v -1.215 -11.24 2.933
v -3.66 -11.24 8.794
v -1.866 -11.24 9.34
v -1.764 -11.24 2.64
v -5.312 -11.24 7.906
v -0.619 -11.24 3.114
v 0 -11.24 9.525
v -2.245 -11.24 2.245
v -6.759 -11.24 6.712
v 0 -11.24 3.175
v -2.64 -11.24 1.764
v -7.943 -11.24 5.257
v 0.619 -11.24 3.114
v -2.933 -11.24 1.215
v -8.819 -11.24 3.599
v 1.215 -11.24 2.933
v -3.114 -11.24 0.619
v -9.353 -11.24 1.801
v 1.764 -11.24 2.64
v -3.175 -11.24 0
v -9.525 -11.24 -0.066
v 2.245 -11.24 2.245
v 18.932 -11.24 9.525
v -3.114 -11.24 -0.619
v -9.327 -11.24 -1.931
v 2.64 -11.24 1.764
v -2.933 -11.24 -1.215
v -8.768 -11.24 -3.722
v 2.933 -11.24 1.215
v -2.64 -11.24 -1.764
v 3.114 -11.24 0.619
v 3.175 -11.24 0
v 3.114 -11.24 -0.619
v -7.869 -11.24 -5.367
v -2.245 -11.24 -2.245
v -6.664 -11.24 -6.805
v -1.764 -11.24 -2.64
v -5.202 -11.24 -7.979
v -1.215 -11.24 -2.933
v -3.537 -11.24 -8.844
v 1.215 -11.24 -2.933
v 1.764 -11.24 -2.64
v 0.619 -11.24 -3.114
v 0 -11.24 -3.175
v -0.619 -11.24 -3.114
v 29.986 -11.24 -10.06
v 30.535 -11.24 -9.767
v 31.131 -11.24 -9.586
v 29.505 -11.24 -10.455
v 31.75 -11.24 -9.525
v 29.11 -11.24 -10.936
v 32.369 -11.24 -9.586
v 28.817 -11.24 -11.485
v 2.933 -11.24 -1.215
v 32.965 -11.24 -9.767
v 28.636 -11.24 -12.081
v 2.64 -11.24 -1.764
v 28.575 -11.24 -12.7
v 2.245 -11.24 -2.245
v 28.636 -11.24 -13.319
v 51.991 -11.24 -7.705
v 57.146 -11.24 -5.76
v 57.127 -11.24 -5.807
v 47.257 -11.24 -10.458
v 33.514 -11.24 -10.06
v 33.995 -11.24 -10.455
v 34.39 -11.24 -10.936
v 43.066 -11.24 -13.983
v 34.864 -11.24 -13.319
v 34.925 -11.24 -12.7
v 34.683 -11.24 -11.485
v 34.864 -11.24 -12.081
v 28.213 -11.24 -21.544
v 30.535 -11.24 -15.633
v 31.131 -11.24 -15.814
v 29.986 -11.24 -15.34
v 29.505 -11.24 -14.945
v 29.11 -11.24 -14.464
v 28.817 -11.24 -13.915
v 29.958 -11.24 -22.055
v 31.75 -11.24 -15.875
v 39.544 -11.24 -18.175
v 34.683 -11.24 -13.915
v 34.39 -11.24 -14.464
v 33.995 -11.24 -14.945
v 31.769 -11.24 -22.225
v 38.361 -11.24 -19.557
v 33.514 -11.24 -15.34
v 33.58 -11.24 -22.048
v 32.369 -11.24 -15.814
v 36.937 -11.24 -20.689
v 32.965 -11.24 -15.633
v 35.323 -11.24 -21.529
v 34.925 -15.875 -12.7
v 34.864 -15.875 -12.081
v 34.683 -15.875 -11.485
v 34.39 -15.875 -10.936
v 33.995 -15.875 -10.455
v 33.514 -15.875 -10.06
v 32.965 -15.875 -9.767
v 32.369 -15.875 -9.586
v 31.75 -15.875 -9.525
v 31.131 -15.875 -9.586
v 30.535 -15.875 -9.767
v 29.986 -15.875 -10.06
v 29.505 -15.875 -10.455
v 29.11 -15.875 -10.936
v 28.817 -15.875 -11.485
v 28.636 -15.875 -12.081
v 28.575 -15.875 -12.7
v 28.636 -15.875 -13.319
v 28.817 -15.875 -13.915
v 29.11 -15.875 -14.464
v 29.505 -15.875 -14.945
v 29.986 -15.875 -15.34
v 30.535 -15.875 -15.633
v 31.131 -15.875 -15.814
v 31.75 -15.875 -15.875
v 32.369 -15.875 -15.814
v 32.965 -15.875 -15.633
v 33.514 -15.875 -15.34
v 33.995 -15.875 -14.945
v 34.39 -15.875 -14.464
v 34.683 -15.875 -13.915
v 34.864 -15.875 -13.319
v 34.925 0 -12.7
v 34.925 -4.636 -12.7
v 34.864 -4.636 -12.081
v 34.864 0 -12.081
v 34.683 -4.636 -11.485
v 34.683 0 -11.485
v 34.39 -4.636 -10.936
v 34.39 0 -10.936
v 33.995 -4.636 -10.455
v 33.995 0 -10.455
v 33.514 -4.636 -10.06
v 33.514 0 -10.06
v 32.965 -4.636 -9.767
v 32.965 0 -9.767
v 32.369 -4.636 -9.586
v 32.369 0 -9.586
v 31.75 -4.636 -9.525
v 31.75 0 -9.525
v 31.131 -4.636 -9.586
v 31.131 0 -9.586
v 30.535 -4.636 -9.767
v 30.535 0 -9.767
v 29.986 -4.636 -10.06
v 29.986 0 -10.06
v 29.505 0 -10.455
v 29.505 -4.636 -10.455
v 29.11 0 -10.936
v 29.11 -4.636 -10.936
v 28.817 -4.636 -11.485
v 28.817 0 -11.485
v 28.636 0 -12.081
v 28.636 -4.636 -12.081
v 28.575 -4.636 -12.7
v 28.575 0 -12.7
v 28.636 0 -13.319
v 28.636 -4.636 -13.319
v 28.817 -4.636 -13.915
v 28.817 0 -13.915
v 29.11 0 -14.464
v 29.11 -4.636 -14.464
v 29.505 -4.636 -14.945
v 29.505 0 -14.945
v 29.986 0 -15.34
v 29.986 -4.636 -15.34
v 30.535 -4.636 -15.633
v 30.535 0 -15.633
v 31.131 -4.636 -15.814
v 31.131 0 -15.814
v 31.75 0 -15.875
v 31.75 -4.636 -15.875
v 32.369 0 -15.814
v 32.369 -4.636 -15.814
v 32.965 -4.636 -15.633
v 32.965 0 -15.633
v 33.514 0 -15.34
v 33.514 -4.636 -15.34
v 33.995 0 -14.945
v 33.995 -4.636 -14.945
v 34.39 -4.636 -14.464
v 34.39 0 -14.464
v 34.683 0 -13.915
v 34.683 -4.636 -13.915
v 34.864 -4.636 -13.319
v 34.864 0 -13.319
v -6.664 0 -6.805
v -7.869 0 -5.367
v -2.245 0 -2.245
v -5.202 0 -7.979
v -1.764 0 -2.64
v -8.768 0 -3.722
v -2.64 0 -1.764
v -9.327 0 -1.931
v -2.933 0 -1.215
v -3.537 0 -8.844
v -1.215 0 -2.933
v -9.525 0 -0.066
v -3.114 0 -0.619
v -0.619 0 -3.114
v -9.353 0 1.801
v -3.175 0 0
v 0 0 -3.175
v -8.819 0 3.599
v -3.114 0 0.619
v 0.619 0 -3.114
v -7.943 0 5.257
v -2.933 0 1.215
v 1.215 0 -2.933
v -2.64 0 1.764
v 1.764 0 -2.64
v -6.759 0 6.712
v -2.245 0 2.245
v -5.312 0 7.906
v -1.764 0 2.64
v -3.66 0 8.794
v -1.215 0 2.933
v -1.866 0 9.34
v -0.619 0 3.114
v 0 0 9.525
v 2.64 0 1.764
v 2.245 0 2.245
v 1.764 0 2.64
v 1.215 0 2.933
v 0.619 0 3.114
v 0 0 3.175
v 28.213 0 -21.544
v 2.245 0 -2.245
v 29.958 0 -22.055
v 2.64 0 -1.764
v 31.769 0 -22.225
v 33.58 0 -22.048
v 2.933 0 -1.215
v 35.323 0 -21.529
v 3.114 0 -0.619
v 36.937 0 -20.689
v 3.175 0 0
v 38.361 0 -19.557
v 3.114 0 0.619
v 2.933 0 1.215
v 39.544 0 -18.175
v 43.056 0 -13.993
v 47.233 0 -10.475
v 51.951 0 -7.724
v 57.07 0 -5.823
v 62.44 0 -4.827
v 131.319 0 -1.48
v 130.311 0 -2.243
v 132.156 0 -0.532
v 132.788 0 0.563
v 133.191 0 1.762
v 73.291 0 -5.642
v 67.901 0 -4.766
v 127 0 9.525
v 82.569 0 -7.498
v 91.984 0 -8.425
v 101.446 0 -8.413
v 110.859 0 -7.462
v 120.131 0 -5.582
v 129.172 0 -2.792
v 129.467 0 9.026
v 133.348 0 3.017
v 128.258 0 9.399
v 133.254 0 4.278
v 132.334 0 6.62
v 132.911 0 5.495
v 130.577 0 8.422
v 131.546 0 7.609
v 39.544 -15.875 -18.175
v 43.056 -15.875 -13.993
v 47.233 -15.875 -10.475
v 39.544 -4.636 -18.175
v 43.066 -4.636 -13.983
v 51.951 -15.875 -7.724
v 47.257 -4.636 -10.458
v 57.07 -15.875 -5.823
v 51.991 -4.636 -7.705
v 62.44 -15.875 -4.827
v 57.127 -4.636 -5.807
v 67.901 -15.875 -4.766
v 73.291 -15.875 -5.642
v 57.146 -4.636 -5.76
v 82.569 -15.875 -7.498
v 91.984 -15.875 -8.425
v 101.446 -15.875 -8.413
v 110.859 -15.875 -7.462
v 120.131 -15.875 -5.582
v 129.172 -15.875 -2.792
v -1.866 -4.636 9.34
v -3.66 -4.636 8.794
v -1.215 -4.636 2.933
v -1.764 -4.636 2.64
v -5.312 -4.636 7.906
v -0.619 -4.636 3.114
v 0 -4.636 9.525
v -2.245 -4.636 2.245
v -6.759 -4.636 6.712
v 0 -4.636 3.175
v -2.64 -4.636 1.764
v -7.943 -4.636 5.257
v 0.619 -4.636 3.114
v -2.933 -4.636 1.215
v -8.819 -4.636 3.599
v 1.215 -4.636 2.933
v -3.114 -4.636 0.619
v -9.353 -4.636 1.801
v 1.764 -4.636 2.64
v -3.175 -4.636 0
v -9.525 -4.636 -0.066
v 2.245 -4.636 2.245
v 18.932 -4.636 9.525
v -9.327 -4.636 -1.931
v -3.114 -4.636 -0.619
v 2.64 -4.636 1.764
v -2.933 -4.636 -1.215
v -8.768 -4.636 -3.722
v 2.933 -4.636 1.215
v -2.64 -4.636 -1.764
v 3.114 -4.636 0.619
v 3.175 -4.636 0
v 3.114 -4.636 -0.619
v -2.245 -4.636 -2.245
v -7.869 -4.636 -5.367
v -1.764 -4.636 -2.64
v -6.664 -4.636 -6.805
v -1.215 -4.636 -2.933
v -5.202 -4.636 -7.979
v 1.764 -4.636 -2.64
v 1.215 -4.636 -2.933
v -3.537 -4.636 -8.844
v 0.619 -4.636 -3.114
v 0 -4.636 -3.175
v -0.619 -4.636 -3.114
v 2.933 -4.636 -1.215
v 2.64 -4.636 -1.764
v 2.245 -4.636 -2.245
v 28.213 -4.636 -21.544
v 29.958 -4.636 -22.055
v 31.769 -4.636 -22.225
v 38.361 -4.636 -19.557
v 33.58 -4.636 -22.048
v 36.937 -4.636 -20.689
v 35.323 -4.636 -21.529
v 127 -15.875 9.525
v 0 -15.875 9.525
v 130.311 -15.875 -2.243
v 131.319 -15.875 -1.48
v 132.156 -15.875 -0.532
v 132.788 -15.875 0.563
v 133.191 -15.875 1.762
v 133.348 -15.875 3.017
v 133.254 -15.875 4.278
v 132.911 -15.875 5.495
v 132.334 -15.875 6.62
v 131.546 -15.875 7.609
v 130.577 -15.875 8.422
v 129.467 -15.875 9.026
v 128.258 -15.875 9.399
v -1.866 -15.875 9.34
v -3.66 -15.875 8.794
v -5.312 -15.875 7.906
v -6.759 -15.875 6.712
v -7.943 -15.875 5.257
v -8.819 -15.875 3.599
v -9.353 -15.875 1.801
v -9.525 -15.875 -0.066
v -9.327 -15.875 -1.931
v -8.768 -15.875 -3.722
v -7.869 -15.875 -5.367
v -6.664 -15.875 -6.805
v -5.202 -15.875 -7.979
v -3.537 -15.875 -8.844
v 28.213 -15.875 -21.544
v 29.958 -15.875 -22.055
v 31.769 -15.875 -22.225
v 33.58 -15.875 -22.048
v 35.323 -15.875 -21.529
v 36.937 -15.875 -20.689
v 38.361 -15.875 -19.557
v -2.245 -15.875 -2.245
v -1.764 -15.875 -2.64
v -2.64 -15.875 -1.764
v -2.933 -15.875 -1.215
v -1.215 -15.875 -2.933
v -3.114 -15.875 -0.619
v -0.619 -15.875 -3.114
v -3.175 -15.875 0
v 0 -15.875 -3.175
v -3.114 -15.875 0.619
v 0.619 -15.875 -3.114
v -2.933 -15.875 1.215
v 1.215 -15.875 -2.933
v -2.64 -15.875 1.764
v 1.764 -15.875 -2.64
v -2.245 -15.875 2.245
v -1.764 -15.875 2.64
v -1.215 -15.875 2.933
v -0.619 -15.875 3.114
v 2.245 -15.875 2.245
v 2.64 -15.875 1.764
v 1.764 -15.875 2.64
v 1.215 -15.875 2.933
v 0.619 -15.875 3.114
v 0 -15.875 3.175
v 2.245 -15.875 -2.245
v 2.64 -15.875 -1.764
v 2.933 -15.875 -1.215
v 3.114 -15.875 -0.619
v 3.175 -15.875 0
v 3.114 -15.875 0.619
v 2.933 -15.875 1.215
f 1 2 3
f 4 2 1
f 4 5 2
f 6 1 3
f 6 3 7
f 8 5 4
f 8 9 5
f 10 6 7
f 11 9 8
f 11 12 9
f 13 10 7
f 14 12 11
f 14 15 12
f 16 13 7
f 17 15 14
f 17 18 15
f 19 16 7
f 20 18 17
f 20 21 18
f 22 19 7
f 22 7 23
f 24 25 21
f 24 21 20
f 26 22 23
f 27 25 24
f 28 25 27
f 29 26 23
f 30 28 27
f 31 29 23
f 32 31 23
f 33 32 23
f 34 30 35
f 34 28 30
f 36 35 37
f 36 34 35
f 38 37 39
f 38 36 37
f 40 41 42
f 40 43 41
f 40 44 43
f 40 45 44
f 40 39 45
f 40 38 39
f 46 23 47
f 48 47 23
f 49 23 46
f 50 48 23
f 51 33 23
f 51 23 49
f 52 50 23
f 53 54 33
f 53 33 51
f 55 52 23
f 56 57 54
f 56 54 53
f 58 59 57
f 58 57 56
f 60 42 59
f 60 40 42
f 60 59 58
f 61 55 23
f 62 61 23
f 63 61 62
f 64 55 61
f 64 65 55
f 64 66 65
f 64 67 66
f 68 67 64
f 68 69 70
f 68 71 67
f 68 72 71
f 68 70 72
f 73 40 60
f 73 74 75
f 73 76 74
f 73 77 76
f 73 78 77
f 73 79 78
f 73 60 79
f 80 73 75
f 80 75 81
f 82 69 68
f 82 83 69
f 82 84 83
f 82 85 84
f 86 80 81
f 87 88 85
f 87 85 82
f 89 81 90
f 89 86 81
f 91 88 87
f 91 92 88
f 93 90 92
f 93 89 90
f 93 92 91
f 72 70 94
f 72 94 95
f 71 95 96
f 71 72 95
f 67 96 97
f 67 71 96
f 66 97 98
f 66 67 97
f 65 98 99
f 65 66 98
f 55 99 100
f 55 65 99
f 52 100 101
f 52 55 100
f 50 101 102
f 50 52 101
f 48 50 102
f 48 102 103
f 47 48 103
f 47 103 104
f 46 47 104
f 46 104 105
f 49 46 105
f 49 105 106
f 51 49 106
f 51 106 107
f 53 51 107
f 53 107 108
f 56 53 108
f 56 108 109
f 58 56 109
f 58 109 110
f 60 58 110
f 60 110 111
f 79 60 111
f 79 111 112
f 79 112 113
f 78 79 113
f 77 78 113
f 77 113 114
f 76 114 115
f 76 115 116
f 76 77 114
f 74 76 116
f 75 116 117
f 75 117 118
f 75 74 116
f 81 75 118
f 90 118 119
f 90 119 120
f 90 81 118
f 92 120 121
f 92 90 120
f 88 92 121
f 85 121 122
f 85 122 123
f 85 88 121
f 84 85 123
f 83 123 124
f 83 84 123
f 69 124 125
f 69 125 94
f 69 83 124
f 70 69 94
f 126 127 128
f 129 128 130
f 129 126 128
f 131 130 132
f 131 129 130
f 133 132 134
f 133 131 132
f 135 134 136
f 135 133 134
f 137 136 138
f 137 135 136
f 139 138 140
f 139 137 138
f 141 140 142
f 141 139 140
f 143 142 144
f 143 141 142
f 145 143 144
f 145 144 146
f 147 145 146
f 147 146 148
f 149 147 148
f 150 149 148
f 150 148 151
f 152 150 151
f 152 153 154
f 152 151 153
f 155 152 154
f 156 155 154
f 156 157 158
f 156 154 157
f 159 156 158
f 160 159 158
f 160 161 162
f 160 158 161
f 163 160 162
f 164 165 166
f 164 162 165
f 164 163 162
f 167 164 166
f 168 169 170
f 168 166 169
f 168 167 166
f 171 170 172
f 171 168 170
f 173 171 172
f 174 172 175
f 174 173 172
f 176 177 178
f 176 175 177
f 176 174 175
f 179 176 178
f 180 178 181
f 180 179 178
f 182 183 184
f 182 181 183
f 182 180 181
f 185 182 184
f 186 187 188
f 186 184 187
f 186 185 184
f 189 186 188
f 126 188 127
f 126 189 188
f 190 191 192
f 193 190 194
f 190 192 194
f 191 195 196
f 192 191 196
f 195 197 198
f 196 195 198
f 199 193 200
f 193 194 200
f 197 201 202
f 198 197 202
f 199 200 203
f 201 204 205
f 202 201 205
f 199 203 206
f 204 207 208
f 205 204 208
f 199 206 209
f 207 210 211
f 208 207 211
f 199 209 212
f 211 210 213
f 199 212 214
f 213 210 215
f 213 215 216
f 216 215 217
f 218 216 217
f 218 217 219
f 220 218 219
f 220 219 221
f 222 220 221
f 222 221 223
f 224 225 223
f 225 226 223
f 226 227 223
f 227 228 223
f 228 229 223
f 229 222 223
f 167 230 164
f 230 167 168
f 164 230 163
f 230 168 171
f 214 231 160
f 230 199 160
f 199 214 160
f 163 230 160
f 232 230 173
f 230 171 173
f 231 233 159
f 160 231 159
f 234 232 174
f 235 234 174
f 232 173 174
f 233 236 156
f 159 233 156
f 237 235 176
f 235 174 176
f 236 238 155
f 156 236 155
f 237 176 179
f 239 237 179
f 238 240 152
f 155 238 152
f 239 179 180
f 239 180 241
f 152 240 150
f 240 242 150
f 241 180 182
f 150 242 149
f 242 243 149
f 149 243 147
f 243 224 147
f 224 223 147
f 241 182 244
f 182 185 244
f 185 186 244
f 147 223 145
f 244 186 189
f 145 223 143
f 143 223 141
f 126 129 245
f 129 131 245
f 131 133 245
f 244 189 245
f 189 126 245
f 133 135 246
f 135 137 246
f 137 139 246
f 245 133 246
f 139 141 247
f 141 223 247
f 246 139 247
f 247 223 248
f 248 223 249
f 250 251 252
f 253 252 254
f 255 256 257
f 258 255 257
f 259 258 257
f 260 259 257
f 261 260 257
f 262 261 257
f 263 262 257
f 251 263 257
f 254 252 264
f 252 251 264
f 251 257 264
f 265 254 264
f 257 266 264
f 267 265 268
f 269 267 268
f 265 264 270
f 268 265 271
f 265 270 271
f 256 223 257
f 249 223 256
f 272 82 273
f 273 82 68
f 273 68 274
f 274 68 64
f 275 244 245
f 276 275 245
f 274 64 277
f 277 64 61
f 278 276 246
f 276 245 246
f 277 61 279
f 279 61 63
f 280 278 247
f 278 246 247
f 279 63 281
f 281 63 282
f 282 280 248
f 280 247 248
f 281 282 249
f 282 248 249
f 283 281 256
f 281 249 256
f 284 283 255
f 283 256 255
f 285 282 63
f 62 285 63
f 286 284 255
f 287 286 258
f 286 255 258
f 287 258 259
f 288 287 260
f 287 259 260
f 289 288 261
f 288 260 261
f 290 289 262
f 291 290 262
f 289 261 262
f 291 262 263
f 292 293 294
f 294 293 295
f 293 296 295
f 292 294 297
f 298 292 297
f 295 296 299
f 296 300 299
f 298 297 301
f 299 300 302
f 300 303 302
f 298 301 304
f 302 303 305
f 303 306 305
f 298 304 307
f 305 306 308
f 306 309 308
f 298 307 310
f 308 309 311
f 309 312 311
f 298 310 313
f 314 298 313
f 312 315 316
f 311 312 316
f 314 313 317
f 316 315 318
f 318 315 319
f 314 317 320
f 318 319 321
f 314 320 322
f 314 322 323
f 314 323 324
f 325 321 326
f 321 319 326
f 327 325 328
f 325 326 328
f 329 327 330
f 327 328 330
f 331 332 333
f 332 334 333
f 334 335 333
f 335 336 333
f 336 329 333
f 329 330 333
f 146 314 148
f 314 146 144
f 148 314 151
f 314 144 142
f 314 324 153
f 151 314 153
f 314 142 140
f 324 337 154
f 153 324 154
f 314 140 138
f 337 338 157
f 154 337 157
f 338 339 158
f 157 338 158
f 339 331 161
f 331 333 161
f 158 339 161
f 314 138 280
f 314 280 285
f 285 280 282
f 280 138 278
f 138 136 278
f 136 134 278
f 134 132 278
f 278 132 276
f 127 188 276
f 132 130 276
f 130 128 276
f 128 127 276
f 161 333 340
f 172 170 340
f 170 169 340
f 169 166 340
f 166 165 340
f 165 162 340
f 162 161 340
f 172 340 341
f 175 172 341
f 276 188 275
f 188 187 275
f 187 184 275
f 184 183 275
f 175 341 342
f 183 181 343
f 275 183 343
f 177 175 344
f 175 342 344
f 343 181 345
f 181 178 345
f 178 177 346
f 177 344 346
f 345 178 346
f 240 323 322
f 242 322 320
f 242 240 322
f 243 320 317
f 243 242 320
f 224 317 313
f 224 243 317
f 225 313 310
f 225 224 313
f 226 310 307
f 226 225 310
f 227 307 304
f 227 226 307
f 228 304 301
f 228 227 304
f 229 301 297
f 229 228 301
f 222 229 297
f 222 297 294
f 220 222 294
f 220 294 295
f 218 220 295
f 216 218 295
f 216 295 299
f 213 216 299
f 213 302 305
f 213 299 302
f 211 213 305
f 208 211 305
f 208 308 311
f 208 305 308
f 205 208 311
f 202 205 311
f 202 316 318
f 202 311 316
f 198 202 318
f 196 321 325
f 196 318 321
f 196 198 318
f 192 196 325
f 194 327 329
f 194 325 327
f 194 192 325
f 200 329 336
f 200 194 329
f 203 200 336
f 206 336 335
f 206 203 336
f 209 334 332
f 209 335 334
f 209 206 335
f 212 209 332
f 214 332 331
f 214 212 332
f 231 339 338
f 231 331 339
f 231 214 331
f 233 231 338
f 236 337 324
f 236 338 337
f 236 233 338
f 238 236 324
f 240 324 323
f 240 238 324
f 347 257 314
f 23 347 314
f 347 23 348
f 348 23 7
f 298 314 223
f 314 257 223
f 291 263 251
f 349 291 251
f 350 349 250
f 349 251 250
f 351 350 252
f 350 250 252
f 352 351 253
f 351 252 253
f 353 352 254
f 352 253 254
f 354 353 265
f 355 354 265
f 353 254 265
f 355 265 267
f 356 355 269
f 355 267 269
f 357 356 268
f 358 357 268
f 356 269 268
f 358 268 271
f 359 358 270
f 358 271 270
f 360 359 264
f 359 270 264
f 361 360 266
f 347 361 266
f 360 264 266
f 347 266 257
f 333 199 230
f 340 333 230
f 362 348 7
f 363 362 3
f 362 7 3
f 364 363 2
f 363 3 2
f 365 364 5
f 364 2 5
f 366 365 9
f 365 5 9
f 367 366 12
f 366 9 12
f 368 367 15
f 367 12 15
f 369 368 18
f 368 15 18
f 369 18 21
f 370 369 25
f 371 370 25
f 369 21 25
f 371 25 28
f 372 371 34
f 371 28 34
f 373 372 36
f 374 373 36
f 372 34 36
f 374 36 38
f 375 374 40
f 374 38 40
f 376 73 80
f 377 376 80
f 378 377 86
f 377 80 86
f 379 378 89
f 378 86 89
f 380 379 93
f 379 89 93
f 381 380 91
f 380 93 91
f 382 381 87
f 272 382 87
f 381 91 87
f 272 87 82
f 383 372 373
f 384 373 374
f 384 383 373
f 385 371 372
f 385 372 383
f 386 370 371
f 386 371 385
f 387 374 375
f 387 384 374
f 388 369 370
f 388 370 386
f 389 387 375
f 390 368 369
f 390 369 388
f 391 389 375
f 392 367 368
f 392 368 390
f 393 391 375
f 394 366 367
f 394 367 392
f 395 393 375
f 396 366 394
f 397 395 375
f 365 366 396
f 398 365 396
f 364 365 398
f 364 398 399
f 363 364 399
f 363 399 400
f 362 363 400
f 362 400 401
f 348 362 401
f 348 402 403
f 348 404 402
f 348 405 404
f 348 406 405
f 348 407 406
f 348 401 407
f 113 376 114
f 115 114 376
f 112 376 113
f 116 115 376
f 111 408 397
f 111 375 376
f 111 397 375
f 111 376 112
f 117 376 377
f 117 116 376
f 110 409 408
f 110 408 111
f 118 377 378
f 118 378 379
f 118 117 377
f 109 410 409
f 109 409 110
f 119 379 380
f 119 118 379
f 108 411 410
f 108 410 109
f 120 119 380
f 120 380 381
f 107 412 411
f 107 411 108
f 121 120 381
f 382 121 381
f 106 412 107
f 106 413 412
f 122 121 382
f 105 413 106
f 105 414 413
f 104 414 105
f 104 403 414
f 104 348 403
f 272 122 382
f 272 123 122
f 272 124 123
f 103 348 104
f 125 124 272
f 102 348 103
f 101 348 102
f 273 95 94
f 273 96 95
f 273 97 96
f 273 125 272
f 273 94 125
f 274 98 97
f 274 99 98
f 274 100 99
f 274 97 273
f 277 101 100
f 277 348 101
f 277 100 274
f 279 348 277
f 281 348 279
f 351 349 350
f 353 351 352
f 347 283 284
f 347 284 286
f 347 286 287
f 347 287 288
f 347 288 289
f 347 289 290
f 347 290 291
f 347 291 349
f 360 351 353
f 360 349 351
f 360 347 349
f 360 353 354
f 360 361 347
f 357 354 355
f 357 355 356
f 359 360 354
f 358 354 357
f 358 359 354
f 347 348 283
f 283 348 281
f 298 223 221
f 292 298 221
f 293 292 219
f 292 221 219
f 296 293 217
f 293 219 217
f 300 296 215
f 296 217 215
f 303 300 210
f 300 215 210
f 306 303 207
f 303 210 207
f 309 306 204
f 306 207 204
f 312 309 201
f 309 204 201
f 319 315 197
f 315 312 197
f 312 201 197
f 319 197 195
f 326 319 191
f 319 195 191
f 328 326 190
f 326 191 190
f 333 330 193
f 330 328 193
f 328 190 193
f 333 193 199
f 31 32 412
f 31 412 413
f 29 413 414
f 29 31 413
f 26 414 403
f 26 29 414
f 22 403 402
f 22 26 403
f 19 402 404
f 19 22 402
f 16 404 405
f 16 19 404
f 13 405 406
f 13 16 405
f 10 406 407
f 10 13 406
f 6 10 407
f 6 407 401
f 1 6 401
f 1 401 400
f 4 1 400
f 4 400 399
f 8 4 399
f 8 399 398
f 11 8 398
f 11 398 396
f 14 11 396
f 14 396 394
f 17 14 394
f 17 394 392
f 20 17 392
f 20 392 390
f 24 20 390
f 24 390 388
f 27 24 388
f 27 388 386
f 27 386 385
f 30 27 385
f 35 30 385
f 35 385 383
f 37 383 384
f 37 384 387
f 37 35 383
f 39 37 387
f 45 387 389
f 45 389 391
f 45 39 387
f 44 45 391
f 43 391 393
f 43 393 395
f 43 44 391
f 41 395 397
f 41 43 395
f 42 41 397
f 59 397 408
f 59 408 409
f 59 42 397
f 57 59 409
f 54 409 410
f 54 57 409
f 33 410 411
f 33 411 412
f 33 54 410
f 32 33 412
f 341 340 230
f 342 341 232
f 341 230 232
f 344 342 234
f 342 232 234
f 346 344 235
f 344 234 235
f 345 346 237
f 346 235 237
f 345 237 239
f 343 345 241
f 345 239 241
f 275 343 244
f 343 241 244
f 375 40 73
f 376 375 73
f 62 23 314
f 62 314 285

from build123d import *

# Parameters (mm, degrees)
F0_R     = 3.175
F1_DEPTH = 15.875
F2_W     = 76.2
F2_H     = 6.604
F3_DEPTH = 25.4


# Not quite as in the source:
# - a length typed as a fraction of an inch, garbled in the dataset ("3 / 203.2 mm" for 3/8 in), is restored


with BuildPart() as f1:
    # F0 (on Front) → F1 (new body)
    with BuildSketch(Plane.XZ):
        with BuildLine():
            Line((127, 9.525), (0, 9.525))
            ThreePointArc((0, 9.525), (-9.3531345836, 1.801249139), (-3.5374961923, -8.8437404807))
            Line((-3.5374961923, -8.8437404807), (28.2125038077, -21.5437404807))
            ThreePointArc((28.2125038077, -21.5437404807), (34.4639700258, -21.8301693138), (39.543916522, -18.1754442969))
            ThreePointArc((39.543916522, -18.1754442969), (54.4695569537, -6.6633605399), (73.291331011, -5.641775468))
            ThreePointArc((73.291331011, -5.641775468), (101.4455517982, -8.4127099235), (129.1718279101, -2.792048142))
            ThreePointArc((129.1718279101, -2.792048142), (133.2535292316, 4.2776659282), (127, 9.525))
        make_face()
        with Locations((31.75, -12.7)):
            Circle(F0_R, mode=Mode.SUBTRACT)
        Circle(F0_R, mode=Mode.SUBTRACT)
    extrude(amount=F1_DEPTH)

    # F2 (on face) → F3 (cut)
    with BuildSketch(Plane(origin=(-3.5374961923, 0, -8.8437404807), x_dir=(0.9284766909, 0, -0.3713906764), z_dir=(-0.3713906764, 0, -0.9284766909))):
        with Locations((17.0978982627, 7.9375)):
            Rectangle(F2_W, F2_H)
    extrude(amount=-F3_DEPTH, mode=Mode.SUBTRACT)


solid = f1.part
